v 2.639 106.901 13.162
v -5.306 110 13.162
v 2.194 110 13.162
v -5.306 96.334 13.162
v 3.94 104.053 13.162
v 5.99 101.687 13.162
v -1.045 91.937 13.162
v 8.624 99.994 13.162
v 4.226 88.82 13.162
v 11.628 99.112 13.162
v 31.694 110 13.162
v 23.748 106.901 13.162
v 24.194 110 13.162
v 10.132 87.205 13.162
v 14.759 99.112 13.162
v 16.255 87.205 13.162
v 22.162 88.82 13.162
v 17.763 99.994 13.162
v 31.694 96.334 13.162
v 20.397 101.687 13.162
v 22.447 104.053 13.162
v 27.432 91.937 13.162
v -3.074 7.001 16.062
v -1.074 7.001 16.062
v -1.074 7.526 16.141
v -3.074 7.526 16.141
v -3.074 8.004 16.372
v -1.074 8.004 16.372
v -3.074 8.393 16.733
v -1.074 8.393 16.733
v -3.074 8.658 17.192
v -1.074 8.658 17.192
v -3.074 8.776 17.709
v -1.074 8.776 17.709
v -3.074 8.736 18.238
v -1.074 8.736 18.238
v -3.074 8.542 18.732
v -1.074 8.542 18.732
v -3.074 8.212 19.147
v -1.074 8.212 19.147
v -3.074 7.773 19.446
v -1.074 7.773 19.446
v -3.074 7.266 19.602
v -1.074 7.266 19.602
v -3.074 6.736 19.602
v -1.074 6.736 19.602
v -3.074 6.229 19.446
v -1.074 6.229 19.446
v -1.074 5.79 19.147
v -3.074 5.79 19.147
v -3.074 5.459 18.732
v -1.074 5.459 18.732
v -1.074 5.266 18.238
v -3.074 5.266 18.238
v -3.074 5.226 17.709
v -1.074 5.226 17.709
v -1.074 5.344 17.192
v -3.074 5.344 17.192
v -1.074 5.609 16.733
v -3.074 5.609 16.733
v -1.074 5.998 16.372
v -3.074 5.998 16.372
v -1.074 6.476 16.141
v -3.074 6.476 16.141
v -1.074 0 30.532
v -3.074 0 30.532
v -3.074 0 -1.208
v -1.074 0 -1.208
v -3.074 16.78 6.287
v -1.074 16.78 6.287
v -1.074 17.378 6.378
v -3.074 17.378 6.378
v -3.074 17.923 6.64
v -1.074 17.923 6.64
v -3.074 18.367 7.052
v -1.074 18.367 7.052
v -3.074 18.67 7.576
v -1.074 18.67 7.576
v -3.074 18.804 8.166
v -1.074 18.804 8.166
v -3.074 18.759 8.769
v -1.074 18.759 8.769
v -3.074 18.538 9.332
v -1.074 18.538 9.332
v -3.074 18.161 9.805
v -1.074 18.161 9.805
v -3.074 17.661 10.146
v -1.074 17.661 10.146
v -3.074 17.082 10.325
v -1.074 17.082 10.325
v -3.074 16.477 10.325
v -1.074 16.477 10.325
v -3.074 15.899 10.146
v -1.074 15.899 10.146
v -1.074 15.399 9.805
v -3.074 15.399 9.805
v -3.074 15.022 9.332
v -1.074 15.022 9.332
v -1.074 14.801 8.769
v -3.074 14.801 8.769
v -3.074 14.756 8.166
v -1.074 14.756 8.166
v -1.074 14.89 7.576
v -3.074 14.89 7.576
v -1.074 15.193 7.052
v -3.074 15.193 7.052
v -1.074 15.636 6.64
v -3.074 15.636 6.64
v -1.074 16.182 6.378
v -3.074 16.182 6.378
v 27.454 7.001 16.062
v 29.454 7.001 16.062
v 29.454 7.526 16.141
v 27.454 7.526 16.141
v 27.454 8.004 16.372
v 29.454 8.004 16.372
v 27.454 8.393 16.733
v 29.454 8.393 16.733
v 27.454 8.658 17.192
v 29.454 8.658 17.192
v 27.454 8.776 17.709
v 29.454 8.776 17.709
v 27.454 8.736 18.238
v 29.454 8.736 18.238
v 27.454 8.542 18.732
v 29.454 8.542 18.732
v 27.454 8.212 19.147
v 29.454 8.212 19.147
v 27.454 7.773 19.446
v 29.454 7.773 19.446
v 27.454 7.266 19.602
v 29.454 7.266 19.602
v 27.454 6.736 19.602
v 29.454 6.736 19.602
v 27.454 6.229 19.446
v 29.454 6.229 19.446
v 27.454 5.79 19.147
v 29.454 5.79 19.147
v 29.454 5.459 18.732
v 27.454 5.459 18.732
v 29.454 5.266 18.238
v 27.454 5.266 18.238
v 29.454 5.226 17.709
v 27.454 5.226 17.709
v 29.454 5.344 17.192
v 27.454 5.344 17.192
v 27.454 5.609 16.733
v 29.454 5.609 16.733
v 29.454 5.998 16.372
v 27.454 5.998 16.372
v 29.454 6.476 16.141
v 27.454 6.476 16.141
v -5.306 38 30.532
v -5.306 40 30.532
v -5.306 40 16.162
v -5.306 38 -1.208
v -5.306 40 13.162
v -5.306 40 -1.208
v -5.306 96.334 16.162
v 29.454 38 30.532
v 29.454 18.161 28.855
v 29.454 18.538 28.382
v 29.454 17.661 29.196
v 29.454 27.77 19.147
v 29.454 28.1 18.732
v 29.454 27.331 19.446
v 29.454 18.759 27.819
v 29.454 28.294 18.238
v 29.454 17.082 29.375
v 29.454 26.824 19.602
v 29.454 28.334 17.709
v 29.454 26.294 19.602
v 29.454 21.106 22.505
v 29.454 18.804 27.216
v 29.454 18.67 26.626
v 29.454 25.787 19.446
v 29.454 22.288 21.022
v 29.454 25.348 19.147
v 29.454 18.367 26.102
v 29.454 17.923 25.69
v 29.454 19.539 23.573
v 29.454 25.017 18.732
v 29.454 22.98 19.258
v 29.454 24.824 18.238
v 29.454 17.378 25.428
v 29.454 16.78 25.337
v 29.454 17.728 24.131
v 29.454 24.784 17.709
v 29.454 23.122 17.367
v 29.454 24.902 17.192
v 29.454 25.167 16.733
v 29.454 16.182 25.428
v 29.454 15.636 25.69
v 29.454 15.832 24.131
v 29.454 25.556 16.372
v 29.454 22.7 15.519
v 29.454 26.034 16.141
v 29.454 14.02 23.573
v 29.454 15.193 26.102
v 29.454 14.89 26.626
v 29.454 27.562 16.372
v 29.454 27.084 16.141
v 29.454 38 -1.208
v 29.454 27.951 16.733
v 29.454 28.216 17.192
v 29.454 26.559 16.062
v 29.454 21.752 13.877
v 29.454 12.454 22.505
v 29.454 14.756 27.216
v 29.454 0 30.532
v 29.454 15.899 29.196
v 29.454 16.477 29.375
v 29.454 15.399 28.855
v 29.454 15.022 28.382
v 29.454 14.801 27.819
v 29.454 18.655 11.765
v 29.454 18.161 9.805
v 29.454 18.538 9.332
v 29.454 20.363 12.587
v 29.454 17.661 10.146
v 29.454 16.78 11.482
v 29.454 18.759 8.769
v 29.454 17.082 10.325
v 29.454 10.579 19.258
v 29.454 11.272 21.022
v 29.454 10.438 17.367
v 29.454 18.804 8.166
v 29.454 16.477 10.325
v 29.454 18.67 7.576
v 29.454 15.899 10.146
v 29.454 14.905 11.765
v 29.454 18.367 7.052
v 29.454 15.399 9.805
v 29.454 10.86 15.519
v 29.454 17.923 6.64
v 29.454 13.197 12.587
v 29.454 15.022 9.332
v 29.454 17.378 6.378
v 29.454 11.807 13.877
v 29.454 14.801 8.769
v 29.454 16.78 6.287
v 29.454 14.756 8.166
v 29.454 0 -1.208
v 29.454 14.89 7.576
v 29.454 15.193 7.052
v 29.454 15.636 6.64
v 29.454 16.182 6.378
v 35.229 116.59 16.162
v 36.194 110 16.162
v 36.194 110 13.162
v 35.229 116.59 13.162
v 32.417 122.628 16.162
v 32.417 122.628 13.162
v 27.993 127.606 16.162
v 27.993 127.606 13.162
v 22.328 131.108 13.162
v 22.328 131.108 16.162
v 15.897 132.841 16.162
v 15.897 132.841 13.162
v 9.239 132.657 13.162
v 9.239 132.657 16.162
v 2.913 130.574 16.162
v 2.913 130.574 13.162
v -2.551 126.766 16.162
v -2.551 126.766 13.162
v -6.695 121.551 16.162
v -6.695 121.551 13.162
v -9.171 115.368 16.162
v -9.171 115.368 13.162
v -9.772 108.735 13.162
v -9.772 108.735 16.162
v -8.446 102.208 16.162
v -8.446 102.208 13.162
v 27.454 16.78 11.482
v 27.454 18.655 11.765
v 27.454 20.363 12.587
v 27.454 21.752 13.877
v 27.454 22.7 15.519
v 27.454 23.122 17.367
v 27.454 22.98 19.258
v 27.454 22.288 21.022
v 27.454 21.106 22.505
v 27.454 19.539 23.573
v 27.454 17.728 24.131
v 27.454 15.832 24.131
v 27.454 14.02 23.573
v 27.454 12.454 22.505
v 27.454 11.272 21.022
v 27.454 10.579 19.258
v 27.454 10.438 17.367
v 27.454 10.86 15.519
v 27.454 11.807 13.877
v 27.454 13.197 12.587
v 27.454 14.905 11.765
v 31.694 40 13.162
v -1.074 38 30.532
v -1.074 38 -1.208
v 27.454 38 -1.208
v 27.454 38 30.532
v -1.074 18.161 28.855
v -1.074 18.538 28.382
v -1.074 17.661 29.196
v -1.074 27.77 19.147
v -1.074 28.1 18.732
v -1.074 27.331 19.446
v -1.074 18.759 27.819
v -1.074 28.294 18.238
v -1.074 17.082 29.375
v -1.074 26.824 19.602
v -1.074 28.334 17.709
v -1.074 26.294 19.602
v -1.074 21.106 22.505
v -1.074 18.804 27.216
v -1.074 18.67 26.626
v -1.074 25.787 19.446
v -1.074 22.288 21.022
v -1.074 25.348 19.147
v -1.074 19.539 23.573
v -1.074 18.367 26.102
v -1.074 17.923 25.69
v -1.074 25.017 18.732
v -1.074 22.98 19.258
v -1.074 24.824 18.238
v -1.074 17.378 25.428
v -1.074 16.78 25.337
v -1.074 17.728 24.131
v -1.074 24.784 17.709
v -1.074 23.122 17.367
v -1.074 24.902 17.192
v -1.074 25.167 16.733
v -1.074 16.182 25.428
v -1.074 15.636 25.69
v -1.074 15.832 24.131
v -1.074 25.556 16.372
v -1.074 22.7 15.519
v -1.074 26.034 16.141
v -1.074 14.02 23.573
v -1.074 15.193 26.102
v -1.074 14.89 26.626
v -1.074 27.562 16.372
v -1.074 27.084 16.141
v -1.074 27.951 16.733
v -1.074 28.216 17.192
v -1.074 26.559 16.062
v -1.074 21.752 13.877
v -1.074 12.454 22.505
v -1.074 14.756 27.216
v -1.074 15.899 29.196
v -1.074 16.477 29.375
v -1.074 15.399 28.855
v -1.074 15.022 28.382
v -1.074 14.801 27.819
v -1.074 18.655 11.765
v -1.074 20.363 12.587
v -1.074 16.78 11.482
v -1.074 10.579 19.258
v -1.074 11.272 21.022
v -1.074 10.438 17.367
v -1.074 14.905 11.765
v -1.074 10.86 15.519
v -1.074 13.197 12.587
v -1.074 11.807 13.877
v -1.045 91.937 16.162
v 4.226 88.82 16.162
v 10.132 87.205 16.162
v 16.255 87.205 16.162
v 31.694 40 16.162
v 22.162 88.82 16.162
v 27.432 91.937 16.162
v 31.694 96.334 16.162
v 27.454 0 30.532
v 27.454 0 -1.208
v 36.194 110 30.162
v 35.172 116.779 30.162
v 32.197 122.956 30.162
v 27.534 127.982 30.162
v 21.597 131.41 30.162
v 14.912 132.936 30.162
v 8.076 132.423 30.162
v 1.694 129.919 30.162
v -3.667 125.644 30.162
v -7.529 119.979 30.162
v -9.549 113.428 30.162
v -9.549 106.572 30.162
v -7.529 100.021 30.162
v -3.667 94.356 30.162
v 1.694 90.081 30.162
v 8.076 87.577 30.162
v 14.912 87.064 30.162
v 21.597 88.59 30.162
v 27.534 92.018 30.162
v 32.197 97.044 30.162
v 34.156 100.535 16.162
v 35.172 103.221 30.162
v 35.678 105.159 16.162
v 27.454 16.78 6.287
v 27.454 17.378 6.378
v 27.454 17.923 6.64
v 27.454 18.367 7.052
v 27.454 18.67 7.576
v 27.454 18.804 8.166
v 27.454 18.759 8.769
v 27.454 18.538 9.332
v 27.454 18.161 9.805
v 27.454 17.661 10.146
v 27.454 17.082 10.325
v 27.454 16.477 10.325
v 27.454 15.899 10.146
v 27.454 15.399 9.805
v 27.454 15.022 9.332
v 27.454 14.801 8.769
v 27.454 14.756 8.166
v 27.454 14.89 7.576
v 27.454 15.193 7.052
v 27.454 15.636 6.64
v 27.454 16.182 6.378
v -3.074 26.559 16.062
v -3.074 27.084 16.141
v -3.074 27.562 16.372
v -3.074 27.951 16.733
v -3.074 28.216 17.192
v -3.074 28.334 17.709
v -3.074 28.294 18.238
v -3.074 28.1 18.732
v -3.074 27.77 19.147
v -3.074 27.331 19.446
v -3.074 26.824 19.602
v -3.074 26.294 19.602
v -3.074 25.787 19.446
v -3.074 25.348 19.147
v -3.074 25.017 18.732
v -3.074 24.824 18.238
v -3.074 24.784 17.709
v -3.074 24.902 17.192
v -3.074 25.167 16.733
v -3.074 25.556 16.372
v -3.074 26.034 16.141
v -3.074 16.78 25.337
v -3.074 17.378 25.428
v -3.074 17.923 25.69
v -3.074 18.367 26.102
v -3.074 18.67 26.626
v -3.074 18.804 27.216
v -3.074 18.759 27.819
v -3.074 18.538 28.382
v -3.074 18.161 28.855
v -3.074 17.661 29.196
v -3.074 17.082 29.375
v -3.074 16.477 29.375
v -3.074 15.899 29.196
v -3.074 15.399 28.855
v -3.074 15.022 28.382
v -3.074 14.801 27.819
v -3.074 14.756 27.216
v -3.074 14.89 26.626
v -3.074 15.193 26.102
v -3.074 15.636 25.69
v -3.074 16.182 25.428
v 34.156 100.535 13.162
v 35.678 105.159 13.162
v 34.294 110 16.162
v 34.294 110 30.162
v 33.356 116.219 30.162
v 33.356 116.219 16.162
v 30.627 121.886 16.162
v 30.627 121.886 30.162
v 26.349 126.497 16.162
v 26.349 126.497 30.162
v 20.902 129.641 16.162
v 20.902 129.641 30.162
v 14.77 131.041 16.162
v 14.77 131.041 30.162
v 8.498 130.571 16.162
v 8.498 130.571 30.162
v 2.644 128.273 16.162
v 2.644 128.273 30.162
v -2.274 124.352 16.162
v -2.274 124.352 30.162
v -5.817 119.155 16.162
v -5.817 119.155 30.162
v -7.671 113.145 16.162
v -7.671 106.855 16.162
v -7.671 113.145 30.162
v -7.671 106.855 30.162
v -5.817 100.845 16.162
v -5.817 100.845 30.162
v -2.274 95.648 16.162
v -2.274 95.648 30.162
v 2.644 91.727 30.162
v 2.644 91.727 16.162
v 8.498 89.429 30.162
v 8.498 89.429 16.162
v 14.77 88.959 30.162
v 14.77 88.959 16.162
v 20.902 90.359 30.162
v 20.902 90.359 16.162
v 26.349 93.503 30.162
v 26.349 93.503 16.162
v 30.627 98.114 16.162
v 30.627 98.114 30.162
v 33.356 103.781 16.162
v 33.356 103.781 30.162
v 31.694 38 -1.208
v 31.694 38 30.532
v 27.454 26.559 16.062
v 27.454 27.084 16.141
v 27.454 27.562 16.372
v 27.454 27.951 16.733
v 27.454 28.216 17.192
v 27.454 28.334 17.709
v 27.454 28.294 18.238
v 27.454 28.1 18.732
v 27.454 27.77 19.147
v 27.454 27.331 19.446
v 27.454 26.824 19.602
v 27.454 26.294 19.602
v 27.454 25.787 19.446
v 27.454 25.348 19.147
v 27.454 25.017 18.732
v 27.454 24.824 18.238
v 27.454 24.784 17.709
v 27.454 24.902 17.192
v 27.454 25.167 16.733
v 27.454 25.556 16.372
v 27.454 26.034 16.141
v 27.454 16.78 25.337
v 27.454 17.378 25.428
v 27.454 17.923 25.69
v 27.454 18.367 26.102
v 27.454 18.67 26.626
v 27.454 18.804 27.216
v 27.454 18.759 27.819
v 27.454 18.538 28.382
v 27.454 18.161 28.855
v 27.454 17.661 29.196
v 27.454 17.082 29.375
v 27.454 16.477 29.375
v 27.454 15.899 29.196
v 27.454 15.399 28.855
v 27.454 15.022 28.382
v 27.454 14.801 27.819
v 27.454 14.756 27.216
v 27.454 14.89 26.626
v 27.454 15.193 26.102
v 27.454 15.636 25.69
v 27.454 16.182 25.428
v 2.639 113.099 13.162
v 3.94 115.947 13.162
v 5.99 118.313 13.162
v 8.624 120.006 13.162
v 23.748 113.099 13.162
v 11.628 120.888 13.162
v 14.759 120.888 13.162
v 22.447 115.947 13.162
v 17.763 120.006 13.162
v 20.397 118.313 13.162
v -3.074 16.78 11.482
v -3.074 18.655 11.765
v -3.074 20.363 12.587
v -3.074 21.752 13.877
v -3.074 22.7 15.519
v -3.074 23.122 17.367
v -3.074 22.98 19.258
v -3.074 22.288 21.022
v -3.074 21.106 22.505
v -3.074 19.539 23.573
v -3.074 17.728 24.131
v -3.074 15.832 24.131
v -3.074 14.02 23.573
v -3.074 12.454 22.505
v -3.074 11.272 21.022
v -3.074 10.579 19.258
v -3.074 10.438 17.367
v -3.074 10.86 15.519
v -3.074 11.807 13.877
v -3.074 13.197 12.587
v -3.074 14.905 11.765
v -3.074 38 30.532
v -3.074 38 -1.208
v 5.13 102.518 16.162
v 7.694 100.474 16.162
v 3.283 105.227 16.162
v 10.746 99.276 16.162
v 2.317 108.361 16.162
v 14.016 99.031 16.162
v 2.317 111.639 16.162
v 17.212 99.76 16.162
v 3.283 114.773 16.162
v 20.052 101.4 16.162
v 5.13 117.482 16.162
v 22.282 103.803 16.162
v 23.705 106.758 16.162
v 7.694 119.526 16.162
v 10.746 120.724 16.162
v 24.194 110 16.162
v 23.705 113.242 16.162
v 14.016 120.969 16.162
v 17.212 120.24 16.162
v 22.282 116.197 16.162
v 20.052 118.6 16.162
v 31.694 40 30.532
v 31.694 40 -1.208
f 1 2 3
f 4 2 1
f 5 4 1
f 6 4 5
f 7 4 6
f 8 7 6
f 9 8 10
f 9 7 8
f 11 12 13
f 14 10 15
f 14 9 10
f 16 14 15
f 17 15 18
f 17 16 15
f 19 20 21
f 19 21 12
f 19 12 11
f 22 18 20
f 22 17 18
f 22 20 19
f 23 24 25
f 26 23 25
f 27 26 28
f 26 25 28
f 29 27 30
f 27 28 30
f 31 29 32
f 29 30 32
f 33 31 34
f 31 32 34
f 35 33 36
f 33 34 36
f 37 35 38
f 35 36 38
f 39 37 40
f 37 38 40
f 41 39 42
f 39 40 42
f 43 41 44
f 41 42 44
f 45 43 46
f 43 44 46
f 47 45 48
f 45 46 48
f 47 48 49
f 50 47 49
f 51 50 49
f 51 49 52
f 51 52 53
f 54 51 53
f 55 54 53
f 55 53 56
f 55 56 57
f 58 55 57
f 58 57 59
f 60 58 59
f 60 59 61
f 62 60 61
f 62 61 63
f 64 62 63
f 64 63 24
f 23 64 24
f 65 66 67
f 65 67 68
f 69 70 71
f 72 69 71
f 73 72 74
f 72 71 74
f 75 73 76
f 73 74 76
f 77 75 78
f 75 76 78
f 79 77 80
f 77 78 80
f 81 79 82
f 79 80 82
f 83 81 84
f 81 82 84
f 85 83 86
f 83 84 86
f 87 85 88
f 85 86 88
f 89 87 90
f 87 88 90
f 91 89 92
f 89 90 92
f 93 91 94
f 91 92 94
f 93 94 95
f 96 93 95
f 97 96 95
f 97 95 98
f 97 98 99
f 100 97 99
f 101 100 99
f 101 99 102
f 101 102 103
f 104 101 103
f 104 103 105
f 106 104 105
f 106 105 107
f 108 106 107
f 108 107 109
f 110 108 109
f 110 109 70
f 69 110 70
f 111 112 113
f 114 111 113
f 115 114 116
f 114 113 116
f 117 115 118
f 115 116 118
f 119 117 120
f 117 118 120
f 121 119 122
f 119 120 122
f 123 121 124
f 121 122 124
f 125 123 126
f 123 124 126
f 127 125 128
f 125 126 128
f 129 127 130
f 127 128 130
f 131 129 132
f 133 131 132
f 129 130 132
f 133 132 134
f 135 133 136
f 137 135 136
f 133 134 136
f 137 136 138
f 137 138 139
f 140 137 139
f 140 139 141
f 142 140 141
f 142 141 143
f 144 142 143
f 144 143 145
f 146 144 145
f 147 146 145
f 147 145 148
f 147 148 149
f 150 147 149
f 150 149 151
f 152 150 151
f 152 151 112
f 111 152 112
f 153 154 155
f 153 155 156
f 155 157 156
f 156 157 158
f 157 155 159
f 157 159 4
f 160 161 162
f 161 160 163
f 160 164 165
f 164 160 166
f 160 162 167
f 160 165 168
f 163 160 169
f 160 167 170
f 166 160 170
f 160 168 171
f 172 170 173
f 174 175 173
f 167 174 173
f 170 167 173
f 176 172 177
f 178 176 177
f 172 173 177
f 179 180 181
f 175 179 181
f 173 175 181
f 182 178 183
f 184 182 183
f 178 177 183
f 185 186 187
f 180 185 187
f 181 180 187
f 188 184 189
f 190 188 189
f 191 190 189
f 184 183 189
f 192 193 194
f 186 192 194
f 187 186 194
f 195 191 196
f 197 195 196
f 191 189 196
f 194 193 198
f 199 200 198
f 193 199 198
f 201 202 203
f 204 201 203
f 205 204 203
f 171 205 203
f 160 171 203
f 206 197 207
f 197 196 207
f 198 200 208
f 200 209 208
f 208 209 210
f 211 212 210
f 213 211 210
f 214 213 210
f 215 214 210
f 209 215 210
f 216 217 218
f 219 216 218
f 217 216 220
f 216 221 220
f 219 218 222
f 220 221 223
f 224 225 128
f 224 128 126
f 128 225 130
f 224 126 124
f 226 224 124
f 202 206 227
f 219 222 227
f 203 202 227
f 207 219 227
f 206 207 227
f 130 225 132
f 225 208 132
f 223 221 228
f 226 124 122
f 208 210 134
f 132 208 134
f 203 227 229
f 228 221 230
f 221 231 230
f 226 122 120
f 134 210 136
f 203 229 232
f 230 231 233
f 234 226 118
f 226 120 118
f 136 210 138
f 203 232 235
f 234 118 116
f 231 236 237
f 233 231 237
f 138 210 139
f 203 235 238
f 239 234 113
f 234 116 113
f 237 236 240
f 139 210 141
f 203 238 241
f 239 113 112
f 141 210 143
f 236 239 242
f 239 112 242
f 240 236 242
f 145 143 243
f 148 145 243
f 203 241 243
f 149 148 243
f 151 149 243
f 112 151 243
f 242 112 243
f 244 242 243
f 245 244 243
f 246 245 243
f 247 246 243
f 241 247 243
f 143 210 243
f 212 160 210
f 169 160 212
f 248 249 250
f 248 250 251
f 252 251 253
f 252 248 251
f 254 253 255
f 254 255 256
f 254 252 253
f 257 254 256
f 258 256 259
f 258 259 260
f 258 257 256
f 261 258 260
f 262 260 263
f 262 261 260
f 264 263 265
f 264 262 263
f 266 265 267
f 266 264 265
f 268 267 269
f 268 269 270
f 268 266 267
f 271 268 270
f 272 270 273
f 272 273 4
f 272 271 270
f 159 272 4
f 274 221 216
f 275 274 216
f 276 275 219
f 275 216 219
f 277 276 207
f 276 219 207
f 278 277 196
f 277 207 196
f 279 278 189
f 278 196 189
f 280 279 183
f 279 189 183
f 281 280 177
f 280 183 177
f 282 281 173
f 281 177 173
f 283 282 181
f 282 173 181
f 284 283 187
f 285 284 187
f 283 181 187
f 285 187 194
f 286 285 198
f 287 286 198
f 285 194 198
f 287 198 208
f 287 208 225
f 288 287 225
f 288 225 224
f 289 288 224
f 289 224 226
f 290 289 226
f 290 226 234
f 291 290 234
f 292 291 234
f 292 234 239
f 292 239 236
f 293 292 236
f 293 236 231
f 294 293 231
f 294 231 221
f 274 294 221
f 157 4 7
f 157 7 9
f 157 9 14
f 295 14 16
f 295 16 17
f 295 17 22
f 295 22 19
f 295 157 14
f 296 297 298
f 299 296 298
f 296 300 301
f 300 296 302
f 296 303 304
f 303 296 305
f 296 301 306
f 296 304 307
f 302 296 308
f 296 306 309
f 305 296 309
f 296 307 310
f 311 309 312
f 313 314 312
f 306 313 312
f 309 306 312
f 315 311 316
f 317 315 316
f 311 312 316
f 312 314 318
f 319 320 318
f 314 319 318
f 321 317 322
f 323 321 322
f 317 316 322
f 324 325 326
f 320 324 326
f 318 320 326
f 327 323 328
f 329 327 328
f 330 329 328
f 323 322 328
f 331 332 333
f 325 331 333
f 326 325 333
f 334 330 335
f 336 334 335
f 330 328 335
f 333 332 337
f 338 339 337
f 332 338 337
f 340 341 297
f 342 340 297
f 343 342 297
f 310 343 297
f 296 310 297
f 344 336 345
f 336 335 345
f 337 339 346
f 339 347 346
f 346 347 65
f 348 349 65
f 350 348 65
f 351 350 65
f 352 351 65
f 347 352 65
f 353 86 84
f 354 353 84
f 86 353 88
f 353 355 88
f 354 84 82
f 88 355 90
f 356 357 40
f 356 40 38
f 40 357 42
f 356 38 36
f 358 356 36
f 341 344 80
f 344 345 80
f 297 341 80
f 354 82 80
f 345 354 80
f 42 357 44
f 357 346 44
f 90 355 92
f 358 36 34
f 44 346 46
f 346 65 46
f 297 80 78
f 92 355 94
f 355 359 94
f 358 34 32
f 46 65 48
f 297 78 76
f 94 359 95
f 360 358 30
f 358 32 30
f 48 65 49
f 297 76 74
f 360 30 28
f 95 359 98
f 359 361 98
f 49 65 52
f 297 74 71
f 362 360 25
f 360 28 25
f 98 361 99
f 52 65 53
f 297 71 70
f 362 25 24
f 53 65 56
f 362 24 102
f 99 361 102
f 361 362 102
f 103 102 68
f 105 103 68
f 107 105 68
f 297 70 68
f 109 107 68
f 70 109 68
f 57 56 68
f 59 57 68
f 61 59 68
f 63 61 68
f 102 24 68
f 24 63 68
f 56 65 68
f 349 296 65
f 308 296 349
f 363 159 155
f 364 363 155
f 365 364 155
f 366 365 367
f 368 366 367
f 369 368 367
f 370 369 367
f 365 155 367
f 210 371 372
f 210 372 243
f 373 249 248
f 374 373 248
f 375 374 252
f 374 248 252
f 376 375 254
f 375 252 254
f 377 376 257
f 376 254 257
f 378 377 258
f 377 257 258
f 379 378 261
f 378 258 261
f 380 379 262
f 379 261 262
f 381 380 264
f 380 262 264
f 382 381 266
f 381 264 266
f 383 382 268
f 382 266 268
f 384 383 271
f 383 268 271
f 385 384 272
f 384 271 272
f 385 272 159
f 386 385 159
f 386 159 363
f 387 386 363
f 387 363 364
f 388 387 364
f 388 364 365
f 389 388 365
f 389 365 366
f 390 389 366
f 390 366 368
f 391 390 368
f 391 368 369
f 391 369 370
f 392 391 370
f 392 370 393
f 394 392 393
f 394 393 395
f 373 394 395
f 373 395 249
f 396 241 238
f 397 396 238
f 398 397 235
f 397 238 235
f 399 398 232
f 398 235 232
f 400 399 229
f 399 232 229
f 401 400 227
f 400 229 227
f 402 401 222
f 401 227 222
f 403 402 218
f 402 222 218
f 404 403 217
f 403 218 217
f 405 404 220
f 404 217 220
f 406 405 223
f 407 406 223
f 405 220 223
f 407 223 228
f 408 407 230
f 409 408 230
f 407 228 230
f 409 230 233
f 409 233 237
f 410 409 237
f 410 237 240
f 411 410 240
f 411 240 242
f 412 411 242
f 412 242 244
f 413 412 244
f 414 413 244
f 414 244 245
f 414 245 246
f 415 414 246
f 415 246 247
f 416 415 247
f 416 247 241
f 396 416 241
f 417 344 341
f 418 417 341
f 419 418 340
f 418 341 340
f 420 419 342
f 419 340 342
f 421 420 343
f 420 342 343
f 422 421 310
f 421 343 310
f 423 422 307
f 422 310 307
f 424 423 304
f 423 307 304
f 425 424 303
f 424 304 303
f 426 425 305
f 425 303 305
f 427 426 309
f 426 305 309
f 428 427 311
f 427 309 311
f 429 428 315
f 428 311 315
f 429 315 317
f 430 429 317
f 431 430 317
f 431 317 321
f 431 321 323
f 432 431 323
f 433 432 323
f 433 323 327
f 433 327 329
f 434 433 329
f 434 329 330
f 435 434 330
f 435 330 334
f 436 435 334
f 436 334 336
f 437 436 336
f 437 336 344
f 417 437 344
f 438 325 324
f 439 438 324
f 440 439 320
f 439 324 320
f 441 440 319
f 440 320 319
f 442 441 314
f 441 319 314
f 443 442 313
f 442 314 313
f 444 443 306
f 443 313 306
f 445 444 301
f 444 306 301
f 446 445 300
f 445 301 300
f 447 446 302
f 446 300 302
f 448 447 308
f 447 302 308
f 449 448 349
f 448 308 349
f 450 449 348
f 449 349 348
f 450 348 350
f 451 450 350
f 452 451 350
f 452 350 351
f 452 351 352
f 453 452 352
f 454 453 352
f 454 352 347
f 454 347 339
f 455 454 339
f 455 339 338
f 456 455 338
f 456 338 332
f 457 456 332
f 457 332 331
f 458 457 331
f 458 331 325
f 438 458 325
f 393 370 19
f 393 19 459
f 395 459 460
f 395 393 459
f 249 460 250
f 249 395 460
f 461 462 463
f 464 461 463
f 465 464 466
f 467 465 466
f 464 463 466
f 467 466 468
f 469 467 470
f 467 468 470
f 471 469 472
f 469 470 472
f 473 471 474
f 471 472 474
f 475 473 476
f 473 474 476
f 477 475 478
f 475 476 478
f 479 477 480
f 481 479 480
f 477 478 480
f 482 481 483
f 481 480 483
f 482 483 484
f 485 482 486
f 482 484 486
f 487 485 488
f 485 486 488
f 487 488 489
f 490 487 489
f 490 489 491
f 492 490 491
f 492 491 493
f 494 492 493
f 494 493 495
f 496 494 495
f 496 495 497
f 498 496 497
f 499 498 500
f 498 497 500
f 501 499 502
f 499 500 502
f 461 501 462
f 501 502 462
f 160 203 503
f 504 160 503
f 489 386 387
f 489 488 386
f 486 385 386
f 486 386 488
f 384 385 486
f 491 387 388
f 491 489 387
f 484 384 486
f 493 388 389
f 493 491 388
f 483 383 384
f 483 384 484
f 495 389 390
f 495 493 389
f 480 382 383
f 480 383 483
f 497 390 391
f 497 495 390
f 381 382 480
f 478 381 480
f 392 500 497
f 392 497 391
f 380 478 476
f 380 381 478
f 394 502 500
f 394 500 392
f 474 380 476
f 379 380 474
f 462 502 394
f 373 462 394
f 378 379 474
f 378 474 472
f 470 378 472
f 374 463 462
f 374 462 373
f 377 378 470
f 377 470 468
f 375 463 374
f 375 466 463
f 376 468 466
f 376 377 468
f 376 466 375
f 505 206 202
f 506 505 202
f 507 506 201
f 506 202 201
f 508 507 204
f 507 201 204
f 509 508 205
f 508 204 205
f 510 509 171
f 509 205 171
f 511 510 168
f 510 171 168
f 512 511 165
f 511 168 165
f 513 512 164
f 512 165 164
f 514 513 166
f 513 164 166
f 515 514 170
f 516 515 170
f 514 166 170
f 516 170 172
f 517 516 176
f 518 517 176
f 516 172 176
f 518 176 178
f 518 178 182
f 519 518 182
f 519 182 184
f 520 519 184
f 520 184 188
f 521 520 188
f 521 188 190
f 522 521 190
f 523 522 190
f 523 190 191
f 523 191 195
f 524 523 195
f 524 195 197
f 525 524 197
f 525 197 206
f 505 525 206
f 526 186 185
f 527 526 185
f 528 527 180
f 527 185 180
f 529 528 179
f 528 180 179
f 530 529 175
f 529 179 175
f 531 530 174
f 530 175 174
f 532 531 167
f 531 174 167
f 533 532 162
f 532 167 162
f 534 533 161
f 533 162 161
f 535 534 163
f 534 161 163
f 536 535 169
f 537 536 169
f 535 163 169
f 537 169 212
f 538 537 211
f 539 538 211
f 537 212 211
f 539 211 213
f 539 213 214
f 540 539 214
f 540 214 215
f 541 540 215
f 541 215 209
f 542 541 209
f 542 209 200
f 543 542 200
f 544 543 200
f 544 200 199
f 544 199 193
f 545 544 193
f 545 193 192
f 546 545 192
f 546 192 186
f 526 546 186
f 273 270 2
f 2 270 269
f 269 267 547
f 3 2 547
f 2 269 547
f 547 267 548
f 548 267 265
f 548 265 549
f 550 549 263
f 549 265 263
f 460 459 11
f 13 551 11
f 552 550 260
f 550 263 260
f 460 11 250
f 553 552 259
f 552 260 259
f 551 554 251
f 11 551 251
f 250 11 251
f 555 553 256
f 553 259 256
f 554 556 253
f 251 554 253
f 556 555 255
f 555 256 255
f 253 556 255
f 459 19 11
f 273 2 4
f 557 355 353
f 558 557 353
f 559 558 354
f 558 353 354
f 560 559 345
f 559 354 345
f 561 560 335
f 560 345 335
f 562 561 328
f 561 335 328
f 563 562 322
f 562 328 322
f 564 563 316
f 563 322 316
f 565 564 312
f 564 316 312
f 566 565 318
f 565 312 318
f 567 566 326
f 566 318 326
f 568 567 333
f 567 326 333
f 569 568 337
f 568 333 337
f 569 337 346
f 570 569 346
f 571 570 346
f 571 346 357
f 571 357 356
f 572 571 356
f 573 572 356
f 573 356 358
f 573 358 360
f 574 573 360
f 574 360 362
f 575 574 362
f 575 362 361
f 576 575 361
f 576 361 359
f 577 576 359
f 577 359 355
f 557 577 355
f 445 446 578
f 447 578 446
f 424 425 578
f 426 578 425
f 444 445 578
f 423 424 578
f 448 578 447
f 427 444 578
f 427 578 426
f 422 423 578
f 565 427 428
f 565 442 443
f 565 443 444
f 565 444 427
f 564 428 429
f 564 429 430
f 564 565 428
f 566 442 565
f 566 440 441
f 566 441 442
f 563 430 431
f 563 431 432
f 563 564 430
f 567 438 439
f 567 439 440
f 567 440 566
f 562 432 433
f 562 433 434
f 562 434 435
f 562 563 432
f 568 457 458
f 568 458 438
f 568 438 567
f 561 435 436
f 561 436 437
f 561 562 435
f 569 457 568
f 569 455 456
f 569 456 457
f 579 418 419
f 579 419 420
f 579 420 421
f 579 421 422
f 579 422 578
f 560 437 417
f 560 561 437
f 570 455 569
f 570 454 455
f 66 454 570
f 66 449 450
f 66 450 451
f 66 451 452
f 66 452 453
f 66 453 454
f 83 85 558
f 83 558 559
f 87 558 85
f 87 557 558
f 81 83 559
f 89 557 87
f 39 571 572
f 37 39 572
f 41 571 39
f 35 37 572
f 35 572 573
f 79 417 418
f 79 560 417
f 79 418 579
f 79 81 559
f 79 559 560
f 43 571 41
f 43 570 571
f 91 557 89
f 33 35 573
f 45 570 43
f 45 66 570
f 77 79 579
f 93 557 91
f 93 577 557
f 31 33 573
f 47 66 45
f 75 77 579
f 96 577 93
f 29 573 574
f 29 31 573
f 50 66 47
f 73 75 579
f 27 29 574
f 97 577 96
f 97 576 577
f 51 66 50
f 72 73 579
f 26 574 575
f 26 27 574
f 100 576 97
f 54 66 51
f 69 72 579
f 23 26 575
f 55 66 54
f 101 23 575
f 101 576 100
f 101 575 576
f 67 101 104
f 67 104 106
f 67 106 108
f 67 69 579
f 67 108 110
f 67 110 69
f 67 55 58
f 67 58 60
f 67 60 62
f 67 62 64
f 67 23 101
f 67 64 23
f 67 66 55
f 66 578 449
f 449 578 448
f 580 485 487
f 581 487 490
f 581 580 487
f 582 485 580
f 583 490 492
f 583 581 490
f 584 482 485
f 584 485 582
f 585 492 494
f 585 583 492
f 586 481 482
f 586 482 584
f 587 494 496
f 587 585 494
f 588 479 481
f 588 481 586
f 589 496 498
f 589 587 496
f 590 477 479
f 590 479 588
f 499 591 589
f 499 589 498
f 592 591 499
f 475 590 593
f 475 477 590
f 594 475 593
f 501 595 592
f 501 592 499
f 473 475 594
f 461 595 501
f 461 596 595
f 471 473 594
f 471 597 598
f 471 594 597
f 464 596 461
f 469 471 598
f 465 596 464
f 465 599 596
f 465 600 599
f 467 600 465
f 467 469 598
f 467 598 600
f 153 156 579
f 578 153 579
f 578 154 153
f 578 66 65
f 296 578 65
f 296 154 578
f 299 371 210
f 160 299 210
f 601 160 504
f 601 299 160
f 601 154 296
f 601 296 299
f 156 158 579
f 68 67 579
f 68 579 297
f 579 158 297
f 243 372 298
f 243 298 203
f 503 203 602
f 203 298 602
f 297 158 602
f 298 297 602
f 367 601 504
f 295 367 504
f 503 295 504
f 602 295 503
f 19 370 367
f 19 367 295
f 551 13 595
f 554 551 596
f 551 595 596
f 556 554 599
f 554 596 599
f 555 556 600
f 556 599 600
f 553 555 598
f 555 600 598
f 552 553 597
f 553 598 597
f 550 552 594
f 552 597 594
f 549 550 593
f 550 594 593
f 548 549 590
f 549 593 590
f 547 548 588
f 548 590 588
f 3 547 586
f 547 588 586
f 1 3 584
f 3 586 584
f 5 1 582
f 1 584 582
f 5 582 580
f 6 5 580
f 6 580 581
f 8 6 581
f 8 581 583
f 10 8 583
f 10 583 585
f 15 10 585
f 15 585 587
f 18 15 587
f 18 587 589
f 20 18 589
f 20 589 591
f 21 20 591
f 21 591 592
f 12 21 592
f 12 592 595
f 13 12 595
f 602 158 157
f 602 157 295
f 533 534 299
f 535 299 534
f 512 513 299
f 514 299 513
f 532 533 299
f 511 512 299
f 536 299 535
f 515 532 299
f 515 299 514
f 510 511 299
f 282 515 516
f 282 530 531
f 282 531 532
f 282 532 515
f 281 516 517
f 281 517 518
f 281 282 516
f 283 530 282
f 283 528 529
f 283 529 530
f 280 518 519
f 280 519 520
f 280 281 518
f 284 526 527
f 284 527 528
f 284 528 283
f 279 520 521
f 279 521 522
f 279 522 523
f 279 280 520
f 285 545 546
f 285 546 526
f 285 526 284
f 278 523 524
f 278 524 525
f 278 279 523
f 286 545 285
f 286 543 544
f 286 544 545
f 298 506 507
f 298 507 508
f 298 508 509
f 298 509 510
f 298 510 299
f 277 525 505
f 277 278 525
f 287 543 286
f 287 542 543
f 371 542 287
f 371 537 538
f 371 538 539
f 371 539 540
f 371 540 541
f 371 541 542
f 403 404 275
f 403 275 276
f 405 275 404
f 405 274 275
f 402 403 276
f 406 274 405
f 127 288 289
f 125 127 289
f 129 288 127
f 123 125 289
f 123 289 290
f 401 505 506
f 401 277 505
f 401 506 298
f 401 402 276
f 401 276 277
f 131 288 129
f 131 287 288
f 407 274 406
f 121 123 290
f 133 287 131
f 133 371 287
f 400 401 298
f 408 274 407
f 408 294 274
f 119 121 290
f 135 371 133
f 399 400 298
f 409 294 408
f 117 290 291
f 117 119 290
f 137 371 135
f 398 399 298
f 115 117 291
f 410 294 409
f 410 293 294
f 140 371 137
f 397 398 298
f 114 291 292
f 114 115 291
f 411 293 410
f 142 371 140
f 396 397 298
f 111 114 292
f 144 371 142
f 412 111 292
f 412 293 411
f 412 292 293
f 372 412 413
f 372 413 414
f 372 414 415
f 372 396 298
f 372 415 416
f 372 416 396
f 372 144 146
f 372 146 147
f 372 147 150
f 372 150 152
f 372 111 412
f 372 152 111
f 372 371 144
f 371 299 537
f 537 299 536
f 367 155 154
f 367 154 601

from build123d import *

# Parameters (mm, degrees)
SKETCH1_W                = 2
SKETCH1_H                = 31.74
BOSS_EXTRUDE1_DEPTH      = 40
BOSS_EXTRUDE1_2_DEPTH    = 40
SKETCH2_W                = 37
SKETCH2_H                = 31.74
BOSS_EXTRUDE3_DEPTH      = 2
SKETCH8_W                = 37
SKETCH8_H                = 3
BOSS_EXTRUDE4_DEPTH      = 70
SKETCH20_R               = 6.36
SKETCH20_R_2             = 1.78
SKETCH20_R_3             = 2.03
CUT_EXTRUDE4_DEPTH       = 3.24
CUT_EXTRUDE4_DEPTH_BACK  = 35.76
SKETCH23_R               = 23
BOSS_EXTRUDE6_DEPTH      = 14
BOSS_EXTRUDE6_DEPTH_BACK = 3
SKETCH25_R               = 21.1
CUT_EXTRUDE5_DEPTH       = 14
SKETCH26_R               = 11
CUT_EXTRUDE6_DEPTH       = 15.37
CUT_EXTRUDE6_DEPTH_BACK  = 18.37


with BuildPart() as part:
    # Sketch1 → Boss-Extrude1 (new body)
    with BuildSketch(Plane(origin=(0, 0, 0), x_dir=(1, 0, 0), z_dir=(0, 1, 0))):
        with Locations((-2.074327578, -14.662349727)):
            Rectangle(SKETCH1_W, SKETCH1_H)
    extrude(amount=BOSS_EXTRUDE1_DEPTH)



with BuildPart() as body_2:
    # Sketch1 → Boss-Extrude1 2 (new body)
    with BuildSketch(Plane(origin=(0, 0, 0), x_dir=(1, 0, 0), z_dir=(0, 1, 0))):
        with Locations((28.453672422, -14.662349727)):
            Rectangle(SKETCH1_W, SKETCH1_H)
    extrude(amount=BOSS_EXTRUDE1_2_DEPTH)


with BuildPart() as part_1:
    add(part.part)

    add(body_2.part)  # Boss-Extrude3 merges body 2
    # Sketch2 → Boss-Extrude3 (add)
    with BuildSketch(Plane(origin=(0, 40, 0), x_dir=(1, 0, 0), z_dir=(0, 1, 0))):
        with Locations((13.193672422, -14.662349727)):
            Rectangle(SKETCH2_W, SKETCH2_H)
    extrude(amount=-BOSS_EXTRUDE3_DEPTH)

    # Sketch8 → Boss-Extrude4 (add)
    with BuildSketch(Plane(origin=(0, 40, 0), x_dir=(1, 0, 0), z_dir=(0, 1, 0))):
        with Locations((13.193672422, -14.662349727)):
            Rectangle(SKETCH8_W, SKETCH8_H)
    extrude(amount=BOSS_EXTRUDE4_DEPTH)

    # Sketch20 → Cut-Extrude4 (cut, two sides)
    with BuildSketch(Plane(origin=(29.453672422, 0, 0), x_dir=(0, 0, -1), z_dir=(1, 0, 0))) as cut_extrude4_sk:
        with Locations((-17.842349727, 16.779878139)):
            Circle(SKETCH20_R)
        with Locations((-17.842349727, 26.558878139)):
            Circle(SKETCH20_R_2)
        with Locations((-17.842349727, 7.000878139)):
            Circle(SKETCH20_R_2)
        with Locations((-27.367349727, 16.779878139)):
            Circle(SKETCH20_R_3)
        with Locations((-8.317349727, 16.779878139)):
            Circle(SKETCH20_R_3)
    extrude(amount=CUT_EXTRUDE4_DEPTH, mode=Mode.SUBTRACT)
    extrude(cut_extrude4_sk.sketch, amount=-CUT_EXTRUDE4_DEPTH_BACK, mode=Mode.SUBTRACT)

    # Sketch23 → Boss-Extrude6 (add, two sides)
    with BuildSketch(Plane.XY.offset(16.162349727)) as boss_extrude6_sk:
        with Locations((13.193672422, 110)):
            Circle(SKETCH23_R)
    extrude(amount=BOSS_EXTRUDE6_DEPTH)
    extrude(boss_extrude6_sk.sketch, amount=-BOSS_EXTRUDE6_DEPTH_BACK)

    # Sketch25 → Cut-Extrude5 (cut)
    with BuildSketch(Plane.XY.offset(30.162349727)):
        with Locations((13.193672422, 110)):
            Circle(SKETCH25_R)
    extrude(amount=-CUT_EXTRUDE5_DEPTH, mode=Mode.SUBTRACT)

    # Sketch26 → Cut-Extrude6 (cut, two sides)
    with BuildSketch(Plane.XY.offset(16.162349727)) as cut_extrude6_sk:
        with Locations((13.193672422, 110)):
            Circle(SKETCH26_R)
    extrude(amount=CUT_EXTRUDE6_DEPTH, mode=Mode.SUBTRACT)
    extrude(cut_extrude6_sk.sketch, amount=-CUT_EXTRUDE6_DEPTH_BACK, mode=Mode.SUBTRACT)


solid = part_1.part
